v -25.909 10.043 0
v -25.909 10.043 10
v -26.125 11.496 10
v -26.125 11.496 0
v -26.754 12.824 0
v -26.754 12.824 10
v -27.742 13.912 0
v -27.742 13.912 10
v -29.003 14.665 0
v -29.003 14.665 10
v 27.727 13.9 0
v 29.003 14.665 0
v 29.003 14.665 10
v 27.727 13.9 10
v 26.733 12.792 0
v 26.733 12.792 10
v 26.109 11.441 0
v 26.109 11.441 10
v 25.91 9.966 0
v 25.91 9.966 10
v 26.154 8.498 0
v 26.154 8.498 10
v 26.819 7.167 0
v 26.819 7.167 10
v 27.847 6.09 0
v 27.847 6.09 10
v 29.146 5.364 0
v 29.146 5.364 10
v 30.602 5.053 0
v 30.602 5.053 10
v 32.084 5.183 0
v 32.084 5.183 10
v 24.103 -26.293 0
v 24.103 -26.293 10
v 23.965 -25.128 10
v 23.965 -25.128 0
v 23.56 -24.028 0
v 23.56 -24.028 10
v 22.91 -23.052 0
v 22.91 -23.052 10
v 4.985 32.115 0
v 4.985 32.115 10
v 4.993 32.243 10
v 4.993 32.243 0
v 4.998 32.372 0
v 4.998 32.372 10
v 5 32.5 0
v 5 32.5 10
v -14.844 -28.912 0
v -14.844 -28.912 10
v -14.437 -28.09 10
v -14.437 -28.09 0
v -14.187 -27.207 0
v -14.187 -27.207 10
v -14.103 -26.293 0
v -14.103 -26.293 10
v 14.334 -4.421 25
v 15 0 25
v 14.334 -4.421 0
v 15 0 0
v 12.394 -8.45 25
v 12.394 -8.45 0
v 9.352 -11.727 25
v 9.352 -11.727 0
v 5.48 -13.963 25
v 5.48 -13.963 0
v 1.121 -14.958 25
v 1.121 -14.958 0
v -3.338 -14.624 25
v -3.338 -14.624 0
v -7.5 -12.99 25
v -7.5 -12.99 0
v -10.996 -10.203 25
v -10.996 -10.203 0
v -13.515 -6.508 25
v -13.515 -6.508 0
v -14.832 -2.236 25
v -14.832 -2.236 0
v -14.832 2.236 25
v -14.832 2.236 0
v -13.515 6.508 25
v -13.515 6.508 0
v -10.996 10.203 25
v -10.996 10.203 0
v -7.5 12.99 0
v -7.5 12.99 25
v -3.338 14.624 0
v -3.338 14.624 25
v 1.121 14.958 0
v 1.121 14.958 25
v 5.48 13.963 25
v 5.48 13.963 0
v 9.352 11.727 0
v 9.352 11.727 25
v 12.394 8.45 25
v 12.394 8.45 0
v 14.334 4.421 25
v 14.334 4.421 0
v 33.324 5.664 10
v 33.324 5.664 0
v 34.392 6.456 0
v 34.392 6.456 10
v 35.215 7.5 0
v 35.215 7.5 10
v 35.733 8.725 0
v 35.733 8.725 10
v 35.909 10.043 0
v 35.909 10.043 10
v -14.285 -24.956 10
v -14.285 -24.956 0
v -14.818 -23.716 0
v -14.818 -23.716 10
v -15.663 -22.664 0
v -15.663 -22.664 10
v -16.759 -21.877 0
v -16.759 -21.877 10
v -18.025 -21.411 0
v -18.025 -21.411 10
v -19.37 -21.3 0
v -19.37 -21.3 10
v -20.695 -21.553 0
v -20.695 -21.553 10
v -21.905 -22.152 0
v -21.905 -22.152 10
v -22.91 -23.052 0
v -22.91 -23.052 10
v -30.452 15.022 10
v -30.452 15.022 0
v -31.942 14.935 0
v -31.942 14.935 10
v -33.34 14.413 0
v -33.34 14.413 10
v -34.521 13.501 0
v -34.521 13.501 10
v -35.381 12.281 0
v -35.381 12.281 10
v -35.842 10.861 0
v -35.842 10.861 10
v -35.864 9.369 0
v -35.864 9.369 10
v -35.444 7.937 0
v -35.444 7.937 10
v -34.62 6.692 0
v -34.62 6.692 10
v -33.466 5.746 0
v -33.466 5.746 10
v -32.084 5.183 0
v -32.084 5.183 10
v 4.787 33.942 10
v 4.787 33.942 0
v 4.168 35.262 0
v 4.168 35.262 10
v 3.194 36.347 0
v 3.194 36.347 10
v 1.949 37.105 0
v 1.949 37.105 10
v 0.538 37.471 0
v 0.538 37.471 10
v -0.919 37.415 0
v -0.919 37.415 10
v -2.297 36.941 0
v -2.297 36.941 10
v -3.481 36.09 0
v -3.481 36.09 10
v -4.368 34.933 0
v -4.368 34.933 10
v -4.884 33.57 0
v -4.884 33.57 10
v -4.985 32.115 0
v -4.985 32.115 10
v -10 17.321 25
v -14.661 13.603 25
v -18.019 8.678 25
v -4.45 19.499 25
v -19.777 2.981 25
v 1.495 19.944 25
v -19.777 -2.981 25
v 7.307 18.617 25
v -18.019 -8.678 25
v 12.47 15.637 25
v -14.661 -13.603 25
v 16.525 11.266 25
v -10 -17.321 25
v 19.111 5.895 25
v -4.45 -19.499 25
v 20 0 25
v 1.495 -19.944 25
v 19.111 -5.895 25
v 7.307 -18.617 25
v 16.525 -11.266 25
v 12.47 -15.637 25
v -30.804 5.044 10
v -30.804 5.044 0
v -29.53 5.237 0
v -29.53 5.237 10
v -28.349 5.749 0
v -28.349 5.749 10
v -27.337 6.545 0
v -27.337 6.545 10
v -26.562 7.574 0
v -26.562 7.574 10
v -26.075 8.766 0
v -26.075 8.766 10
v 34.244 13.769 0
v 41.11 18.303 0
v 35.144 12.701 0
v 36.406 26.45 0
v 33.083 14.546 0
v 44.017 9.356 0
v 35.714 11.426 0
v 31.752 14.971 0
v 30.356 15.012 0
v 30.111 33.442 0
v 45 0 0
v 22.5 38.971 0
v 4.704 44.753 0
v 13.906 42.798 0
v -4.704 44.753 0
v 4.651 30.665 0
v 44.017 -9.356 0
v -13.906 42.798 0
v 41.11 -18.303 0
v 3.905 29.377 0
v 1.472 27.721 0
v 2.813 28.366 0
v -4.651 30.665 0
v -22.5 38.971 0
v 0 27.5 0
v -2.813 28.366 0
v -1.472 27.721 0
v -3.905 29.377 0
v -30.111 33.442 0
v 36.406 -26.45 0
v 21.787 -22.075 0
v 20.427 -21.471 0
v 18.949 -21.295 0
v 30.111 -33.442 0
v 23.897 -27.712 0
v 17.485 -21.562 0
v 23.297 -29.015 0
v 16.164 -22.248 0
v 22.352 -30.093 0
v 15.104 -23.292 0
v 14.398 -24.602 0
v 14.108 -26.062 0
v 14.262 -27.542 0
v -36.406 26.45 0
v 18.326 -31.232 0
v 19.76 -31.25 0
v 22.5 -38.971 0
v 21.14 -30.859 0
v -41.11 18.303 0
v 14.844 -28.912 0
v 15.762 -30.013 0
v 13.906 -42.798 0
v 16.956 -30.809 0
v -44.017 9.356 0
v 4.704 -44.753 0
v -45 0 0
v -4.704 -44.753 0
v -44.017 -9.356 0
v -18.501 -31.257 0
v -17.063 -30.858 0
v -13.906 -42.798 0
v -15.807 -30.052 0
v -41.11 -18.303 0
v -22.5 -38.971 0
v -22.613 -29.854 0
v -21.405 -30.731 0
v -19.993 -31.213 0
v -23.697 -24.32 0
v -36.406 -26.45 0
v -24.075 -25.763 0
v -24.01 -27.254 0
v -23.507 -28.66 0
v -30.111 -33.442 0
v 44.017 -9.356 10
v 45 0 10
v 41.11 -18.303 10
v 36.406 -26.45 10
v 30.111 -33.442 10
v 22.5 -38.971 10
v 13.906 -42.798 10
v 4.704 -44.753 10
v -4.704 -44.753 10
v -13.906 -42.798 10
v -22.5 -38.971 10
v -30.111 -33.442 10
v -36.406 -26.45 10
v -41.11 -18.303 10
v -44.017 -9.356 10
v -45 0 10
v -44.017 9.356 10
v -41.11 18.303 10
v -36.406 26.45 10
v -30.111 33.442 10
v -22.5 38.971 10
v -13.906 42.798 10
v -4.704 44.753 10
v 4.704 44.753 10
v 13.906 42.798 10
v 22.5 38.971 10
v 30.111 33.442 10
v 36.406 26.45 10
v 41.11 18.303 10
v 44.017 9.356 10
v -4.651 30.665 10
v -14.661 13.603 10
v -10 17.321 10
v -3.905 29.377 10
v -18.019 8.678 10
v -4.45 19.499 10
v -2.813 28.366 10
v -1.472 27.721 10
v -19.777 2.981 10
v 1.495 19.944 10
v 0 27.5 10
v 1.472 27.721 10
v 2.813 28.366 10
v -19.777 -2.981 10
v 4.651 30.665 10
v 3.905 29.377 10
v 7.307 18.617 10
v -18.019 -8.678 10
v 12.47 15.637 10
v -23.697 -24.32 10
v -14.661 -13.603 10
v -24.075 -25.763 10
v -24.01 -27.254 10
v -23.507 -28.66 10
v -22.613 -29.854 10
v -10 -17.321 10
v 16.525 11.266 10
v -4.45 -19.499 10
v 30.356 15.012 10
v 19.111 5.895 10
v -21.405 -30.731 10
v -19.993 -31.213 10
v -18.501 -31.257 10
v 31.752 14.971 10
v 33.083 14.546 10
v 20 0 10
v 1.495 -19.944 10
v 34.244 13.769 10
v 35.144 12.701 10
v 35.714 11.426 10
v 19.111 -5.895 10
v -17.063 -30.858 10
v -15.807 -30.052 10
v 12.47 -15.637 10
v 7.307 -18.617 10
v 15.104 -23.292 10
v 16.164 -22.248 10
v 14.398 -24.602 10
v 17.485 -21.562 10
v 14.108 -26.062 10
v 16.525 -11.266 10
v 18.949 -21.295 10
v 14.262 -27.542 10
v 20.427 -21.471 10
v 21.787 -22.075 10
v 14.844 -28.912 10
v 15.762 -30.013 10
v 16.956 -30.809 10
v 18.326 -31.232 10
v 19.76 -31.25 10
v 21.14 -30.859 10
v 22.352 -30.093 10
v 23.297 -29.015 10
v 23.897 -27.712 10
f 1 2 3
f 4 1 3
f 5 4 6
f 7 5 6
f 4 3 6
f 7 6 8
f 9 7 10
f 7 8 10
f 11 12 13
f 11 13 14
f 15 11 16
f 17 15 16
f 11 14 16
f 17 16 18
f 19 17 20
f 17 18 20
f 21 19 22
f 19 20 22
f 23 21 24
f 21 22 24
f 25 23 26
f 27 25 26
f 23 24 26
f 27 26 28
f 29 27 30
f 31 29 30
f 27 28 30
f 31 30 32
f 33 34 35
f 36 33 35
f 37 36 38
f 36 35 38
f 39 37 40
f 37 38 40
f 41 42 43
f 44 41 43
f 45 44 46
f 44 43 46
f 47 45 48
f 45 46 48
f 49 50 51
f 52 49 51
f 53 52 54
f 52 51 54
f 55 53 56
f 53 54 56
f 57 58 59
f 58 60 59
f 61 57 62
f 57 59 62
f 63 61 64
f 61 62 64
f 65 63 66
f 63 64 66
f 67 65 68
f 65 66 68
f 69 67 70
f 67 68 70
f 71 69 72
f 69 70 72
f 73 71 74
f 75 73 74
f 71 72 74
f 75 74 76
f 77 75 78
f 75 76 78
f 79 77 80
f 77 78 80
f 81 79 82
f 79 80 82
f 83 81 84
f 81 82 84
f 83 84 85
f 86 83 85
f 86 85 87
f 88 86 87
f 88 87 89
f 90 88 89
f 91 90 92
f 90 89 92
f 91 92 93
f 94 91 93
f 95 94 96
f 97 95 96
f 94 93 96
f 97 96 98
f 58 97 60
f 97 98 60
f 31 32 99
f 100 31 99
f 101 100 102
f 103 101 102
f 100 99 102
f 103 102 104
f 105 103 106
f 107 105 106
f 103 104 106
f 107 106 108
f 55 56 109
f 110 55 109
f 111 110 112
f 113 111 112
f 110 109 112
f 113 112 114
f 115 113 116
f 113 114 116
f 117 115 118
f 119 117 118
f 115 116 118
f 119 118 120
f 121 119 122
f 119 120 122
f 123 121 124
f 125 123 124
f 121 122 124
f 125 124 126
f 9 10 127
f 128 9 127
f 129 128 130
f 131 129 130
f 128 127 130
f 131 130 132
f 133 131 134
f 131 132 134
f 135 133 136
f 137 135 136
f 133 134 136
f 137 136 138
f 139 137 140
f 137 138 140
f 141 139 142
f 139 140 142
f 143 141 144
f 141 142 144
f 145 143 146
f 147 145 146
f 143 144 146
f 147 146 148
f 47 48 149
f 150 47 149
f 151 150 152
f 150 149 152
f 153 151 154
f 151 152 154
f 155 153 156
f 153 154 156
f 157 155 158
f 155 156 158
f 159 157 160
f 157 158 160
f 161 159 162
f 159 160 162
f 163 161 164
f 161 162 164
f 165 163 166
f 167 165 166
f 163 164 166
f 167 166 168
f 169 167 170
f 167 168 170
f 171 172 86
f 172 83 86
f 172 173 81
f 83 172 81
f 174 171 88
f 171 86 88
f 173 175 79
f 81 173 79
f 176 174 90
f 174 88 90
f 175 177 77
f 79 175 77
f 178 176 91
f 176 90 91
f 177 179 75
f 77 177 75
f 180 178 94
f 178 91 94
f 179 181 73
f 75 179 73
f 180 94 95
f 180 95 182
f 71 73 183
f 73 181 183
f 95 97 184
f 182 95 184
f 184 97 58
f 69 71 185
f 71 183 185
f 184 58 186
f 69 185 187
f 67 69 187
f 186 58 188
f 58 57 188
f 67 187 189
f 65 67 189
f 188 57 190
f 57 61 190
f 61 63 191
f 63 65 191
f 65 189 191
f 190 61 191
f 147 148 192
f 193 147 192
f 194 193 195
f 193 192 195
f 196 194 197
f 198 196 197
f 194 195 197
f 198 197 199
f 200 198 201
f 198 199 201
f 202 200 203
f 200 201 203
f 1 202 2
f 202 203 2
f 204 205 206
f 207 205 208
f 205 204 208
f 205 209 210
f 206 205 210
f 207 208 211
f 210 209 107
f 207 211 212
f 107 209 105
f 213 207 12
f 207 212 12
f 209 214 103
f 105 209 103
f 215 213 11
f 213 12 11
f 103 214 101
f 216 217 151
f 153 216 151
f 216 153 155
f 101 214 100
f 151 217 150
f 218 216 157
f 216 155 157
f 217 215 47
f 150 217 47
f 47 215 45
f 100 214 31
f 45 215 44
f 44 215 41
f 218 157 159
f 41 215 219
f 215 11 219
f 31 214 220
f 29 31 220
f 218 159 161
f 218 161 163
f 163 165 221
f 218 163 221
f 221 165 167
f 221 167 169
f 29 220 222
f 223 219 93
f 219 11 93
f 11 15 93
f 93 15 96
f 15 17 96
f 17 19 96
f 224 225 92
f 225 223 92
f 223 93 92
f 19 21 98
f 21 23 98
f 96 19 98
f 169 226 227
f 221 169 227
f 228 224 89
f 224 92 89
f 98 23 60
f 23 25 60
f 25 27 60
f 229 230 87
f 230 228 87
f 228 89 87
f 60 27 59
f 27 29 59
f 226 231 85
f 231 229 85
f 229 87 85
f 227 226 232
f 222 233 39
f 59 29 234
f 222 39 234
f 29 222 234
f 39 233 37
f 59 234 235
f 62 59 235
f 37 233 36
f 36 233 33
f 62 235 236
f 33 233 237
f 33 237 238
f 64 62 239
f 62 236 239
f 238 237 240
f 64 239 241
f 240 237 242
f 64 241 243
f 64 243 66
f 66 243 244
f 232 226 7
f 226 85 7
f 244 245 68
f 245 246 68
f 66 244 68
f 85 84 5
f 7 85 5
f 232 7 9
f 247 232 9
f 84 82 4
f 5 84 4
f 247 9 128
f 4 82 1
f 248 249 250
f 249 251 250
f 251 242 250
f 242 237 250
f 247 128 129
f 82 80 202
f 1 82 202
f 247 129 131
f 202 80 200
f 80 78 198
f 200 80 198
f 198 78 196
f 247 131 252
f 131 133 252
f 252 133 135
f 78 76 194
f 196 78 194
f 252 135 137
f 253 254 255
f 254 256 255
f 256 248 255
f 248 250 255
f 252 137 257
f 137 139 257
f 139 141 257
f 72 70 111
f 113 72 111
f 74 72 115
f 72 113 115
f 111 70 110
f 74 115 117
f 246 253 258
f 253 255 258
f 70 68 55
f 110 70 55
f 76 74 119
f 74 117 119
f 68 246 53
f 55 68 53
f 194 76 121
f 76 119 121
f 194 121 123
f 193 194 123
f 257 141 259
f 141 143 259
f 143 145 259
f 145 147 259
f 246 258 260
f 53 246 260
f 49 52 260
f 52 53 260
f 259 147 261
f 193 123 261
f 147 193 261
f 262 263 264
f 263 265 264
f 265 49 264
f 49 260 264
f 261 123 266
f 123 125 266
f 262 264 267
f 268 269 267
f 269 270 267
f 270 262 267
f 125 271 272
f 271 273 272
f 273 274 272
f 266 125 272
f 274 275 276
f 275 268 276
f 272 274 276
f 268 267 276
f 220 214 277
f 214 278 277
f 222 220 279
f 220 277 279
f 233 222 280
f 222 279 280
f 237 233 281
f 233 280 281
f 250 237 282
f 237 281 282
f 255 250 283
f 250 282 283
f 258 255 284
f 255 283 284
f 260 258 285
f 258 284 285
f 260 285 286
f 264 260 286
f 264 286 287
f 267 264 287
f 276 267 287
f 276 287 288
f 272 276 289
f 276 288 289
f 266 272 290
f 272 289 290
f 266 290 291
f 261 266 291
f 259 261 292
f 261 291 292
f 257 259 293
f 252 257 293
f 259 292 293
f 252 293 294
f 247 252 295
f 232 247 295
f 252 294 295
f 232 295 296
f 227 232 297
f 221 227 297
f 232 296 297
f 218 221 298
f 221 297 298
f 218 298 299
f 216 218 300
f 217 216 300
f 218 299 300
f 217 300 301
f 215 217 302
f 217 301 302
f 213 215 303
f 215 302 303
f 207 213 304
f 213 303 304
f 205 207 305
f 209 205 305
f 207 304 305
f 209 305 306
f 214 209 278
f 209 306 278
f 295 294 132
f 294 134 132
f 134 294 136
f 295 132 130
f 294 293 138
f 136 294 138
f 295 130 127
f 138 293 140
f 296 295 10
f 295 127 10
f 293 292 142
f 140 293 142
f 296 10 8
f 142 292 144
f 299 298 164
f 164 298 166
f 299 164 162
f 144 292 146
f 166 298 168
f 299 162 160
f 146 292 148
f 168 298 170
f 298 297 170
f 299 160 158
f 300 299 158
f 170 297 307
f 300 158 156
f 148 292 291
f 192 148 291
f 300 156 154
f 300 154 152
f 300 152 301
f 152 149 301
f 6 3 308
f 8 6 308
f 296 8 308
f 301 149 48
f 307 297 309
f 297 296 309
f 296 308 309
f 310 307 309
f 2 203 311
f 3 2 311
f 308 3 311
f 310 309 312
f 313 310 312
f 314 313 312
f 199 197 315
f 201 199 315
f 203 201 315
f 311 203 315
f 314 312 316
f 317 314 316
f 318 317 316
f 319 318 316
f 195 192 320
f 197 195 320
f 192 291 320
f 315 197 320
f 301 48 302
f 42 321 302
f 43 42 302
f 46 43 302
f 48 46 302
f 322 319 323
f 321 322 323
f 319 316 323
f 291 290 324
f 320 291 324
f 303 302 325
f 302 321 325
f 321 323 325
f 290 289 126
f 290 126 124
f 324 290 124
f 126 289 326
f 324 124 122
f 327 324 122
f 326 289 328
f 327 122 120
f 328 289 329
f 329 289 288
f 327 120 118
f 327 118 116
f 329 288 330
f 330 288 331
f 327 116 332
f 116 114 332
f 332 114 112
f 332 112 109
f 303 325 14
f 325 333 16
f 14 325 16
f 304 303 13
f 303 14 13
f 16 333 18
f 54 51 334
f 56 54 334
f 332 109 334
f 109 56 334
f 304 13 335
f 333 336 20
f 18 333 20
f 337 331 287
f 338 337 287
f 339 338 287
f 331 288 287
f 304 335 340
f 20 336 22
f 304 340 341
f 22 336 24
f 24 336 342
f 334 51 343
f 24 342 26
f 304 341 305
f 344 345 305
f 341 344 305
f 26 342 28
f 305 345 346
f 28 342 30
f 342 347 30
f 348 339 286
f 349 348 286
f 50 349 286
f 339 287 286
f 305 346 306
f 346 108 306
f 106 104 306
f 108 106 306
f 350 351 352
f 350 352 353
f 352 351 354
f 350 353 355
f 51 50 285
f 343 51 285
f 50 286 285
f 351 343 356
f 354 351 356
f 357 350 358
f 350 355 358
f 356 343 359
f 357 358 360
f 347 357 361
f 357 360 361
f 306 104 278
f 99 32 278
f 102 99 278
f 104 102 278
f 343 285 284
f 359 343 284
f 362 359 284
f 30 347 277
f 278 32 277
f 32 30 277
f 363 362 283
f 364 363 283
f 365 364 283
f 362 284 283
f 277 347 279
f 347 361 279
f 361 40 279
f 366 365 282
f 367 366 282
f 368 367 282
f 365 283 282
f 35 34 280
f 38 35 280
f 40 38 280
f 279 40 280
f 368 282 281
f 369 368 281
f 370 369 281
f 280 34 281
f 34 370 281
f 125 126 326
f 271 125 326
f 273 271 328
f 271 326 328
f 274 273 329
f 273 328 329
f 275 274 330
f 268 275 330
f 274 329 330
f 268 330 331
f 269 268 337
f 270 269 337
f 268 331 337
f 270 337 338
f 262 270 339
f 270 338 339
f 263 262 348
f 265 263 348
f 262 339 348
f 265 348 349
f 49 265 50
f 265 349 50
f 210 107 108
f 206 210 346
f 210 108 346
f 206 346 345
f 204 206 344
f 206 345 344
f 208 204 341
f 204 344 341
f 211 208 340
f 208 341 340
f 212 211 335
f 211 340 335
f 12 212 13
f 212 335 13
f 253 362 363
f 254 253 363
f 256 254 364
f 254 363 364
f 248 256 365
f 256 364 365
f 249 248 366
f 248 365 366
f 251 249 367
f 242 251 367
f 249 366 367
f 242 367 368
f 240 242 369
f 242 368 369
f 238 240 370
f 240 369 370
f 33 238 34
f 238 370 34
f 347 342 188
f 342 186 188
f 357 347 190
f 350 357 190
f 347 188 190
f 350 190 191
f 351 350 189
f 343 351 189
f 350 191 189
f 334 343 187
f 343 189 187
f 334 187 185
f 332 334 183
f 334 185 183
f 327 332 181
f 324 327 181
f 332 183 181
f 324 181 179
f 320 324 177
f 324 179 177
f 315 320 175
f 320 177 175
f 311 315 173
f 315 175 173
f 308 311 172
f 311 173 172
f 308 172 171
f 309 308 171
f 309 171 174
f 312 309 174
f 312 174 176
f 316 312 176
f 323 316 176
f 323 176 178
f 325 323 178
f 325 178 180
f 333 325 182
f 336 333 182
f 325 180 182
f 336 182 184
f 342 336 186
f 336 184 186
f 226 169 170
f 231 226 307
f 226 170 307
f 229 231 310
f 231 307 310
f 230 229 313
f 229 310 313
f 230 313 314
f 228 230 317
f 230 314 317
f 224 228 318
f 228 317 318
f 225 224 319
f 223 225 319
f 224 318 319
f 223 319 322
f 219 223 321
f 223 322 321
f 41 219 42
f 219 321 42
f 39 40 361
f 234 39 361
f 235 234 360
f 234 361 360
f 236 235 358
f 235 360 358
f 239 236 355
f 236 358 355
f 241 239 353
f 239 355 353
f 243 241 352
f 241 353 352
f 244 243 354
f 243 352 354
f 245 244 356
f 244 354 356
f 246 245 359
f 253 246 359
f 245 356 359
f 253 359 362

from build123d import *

# Parameters (mm, degrees)
F3_DEPTH = 10.001


with BuildPart() as f1:
    # F0 (on Front) → F1 (revolve)
    with BuildSketch(Plane.XZ):
        Polygon((20, 25), (15, 25), (15, 0), (45, 0), (45, 10), (20, 10), align=None)
    revolve(axis=Axis((0, 0, 17.8506122556), (0, 0, -1)))

    # F2 (on face) → F3 (cut, through all)
    with BuildSketch(Plane.XY.offset(10)):
        with BuildLine():
            ThreePointArc((29.0030388795, 14.6653924514), (26.1540541981, 8.4979673453), (32.0840527441, 5.1830068027))
            ThreePointArc((32.0840527441, 5.1830068027), (30.9093367796, 10.0430523172), (29.0030388795, 14.6653924514))
        make_face()
        with BuildLine():
            ThreePointArc((29.0030388795, 14.6653924514), (30.9093367796, 10.0430523172), (32.0840527441, 5.1830068027))
            ThreePointArc((32.0840527441, 5.1830068027), (34.8383048262, 6.9506082855), (35.9093367796, 10.0430523172))
            ThreePointArc((35.9093367796, 10.0430523172), (33.6903896827, 14.1982592615), (29.0030388795, 14.6653924514))
        make_face()
        with BuildLine():
            ThreePointArc((24.1030206995, -26.2930523172), (23.7953091225, -24.5660811664), (22.9100489572, -23.0516736221))
            ThreePointArc((22.9100489572, -23.0516736221), (19.1030206995, -26.2930523172), (14.84384994, -28.9121102474))
            ThreePointArc((14.84384994, -28.9121102474), (20.4639296242, -31.1042815675), (24.1030206995, -26.2930523172))
        make_face()
        with BuildLine():
            ThreePointArc((14.84384994, -28.9121102474), (19.1030206995, -26.2930523172), (22.9100489572, -23.0516736221))
            ThreePointArc((22.9100489572, -23.0516736221), (16.164094438, -22.2479673453), (14.84384994, -28.9121102474))
        make_face()
        with BuildLine():
            ThreePointArc((-4.9851851526, 32.1153846154), (0, 27.5), (4.9851851526, 32.1153846154))
            ThreePointArc((4.9851851526, 32.1153846154), (0, 32.5), (-4.9851851526, 32.1153846154))
        make_face()
        with BuildLine():
            ThreePointArc((-4.9851851526, 32.1153846154), (0, 32.5), (4.9851851526, 32.1153846154))
            ThreePointArc((4.9851851526, 32.1153846154), (4.9962949154, 32.3075496988), (5, 32.5))
            ThreePointArc((5, 32.5), (-0.1924503012, 37.4962949154), (-4.9851851526, 32.1153846154))
        make_face()
        with BuildLine():
            ThreePointArc((-22.9100489572, -23.0516736221), (-22.041946961, -30.3381372891), (-14.84384994, -28.9121102474))
            ThreePointArc((-14.84384994, -28.9121102474), (-19.1030206995, -26.2930523172), (-22.9100489572, -23.0516736221))
        make_face()
        with BuildLine():
            ThreePointArc((-22.9100489572, -23.0516736221), (-19.1030206995, -26.2930523172), (-14.84384994, -28.9121102474))
            ThreePointArc((-14.84384994, -28.9121102474), (-14.2917914492, -27.6539612419), (-14.1030206995, -26.2930523172))
            ThreePointArc((-14.1030206995, -26.2930523172), (-17.3760495487, -21.6007638942), (-22.9100489572, -23.0516736221))
        make_face()
        with BuildLine():
            ThreePointArc((-25.9093367796, 10.0430523172), (-26.7541298353, 12.8241052203), (-29.0030388795, 14.6653924514))
            ThreePointArc((-29.0030388795, 14.6653924514), (-30.9093367796, 10.0430523172), (-32.0840527441, 5.1830068027))
            ThreePointArc((-32.0840527441, 5.1830068027), (-27.8168927479, 6.1140842706), (-25.9093367796, 10.0430523172))
        make_face()
        with BuildLine():
            ThreePointArc((-32.0840527441, 5.1830068027), (-30.9093367796, 10.0430523172), (-29.0030388795, 14.6653924514))
            ThreePointArc((-29.0030388795, 14.6653924514), (-35.6646193611, 11.5881372891), (-32.0840527441, 5.1830068027))
        make_face()
    extrude(amount=-F3_DEPTH, mode=Mode.SUBTRACT)


solid = f1.part
